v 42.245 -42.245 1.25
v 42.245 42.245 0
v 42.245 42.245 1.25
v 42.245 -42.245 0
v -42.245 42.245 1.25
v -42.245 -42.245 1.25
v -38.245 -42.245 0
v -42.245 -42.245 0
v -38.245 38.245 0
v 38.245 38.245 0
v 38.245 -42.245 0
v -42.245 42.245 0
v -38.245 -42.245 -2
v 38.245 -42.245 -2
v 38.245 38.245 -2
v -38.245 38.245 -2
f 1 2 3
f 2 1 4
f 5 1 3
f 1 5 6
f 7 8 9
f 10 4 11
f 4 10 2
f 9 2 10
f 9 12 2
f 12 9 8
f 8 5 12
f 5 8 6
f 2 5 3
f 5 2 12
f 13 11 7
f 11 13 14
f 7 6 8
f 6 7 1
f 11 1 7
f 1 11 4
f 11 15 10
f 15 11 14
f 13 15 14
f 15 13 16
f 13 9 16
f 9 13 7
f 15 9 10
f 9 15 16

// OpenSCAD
// --- INCLUDES ---
/*
All common dimensions are stored in their own SCAD file so that variables are consistent throughout
the multiple files created for this project.
*/
include <Common_Dimensions.scad> // Needs UNDEF

// --- RENDER RESOLUTION ---
/*
Set the rendering resolution. Lower for lower-power systems.
*/
$fn = 128;

// --- DIMENSIONS ---
/*
Local dimensions that are specific to this drawing
*/
// No local dimensions available

// --- FUNCTIONS ---
/*
Functions that make the code more legible and reusable
*/
// No functions

// --- MODULES ---
/*
Cutouts and extrusions are all mapped to their own modules to make the model more readable and
reusable.
*/
// No submodules

// --- MAIN BODY MODULES ---
/*
Modules that draws the main bodies of the components.
*/

// Create a screen with glass
module screen()
{
    // Create some ajustments so it actually looks like the screen is there.
    screen_w_adjusted = screen_w - 0.01;
    screen_h_adjusted = screen_h - 0.01;

    translate([-screen_w_adjusted / 2, -screen_h_adjusted / 2, 0]) union()
    {
        cube([screen_w_adjusted, screen_h_adjusted, screen_glass_d]);
        translate([screen_lip_width, 0, -screen_panel_d]) cube([screen_w_adjusted - 2 * screen_lip_width, screen_h_adjusted - screen_lip_width, screen_panel_d]);
    }
}

// Create a cutout for the screen. Ensures that a support lip exists to make sure the screen is
// both supported and flush with the rest of the housing.
module screen_cutout()
{
    // Main cutout (fits around the glass of the screen)
    main_loc = [-screen_w/2, -screen_h/2, base_d - recess_depth];
    main_dim = [screen_w, screen_h, recess_depth];
    translate(main_loc) cube(main_dim);
    
    // Support lip cutout
    support_lip_loc = [-screen_w/2 + screen_lip_width, -screen_h/2, base_d - (3 * recess_depth)];
    support_lip_dim = [screen_w - (2 * screen_lip_width), screen_h - screen_lip_width, recess_depth * 3];
    translate(support_lip_loc) cube(support_lip_dim);
    
    // Control panel cutout
    control_panel_loc = [screen_w/2 - screen_lip_width, -(screen_h/2 - 18), base_d - (3 * recess_depth)];
    control_panel_dim = [screen_lip_width, screen_btn_d, recess_depth * 3];
    translate(control_panel_loc) cube(control_panel_dim);

    // Screen mounting post cutouts
    screen_post_depth     = recess_depth * 3;
    post_cutout_width     = 4.0;
    post_cutout_height    = 8.0;
 
    upper_screen_post_loc = [-screen_w/2,  (screen_h/2 - (screen_t_post_offset) - (post_cutout_height / 2)), base_d - (3 * recess_depth)];
    lower_screen_post_loc = [-screen_w/2, -(screen_h/2 - (screen_b_post_offset) + (post_cutout_height / 2)), base_d - (3 * recess_depth)];
    
    translate(upper_screen_post_loc) cube([post_cutout_width, post_cutout_height, screen_post_depth]);
    translate(lower_screen_post_loc) cube([post_cutout_width, post_cutout_height, screen_post_depth]);
}

// --- RENDER ---
/*
Actually draw the main shell - In this case, perform a test to make sure the module functions as expected.
*/
screen();
